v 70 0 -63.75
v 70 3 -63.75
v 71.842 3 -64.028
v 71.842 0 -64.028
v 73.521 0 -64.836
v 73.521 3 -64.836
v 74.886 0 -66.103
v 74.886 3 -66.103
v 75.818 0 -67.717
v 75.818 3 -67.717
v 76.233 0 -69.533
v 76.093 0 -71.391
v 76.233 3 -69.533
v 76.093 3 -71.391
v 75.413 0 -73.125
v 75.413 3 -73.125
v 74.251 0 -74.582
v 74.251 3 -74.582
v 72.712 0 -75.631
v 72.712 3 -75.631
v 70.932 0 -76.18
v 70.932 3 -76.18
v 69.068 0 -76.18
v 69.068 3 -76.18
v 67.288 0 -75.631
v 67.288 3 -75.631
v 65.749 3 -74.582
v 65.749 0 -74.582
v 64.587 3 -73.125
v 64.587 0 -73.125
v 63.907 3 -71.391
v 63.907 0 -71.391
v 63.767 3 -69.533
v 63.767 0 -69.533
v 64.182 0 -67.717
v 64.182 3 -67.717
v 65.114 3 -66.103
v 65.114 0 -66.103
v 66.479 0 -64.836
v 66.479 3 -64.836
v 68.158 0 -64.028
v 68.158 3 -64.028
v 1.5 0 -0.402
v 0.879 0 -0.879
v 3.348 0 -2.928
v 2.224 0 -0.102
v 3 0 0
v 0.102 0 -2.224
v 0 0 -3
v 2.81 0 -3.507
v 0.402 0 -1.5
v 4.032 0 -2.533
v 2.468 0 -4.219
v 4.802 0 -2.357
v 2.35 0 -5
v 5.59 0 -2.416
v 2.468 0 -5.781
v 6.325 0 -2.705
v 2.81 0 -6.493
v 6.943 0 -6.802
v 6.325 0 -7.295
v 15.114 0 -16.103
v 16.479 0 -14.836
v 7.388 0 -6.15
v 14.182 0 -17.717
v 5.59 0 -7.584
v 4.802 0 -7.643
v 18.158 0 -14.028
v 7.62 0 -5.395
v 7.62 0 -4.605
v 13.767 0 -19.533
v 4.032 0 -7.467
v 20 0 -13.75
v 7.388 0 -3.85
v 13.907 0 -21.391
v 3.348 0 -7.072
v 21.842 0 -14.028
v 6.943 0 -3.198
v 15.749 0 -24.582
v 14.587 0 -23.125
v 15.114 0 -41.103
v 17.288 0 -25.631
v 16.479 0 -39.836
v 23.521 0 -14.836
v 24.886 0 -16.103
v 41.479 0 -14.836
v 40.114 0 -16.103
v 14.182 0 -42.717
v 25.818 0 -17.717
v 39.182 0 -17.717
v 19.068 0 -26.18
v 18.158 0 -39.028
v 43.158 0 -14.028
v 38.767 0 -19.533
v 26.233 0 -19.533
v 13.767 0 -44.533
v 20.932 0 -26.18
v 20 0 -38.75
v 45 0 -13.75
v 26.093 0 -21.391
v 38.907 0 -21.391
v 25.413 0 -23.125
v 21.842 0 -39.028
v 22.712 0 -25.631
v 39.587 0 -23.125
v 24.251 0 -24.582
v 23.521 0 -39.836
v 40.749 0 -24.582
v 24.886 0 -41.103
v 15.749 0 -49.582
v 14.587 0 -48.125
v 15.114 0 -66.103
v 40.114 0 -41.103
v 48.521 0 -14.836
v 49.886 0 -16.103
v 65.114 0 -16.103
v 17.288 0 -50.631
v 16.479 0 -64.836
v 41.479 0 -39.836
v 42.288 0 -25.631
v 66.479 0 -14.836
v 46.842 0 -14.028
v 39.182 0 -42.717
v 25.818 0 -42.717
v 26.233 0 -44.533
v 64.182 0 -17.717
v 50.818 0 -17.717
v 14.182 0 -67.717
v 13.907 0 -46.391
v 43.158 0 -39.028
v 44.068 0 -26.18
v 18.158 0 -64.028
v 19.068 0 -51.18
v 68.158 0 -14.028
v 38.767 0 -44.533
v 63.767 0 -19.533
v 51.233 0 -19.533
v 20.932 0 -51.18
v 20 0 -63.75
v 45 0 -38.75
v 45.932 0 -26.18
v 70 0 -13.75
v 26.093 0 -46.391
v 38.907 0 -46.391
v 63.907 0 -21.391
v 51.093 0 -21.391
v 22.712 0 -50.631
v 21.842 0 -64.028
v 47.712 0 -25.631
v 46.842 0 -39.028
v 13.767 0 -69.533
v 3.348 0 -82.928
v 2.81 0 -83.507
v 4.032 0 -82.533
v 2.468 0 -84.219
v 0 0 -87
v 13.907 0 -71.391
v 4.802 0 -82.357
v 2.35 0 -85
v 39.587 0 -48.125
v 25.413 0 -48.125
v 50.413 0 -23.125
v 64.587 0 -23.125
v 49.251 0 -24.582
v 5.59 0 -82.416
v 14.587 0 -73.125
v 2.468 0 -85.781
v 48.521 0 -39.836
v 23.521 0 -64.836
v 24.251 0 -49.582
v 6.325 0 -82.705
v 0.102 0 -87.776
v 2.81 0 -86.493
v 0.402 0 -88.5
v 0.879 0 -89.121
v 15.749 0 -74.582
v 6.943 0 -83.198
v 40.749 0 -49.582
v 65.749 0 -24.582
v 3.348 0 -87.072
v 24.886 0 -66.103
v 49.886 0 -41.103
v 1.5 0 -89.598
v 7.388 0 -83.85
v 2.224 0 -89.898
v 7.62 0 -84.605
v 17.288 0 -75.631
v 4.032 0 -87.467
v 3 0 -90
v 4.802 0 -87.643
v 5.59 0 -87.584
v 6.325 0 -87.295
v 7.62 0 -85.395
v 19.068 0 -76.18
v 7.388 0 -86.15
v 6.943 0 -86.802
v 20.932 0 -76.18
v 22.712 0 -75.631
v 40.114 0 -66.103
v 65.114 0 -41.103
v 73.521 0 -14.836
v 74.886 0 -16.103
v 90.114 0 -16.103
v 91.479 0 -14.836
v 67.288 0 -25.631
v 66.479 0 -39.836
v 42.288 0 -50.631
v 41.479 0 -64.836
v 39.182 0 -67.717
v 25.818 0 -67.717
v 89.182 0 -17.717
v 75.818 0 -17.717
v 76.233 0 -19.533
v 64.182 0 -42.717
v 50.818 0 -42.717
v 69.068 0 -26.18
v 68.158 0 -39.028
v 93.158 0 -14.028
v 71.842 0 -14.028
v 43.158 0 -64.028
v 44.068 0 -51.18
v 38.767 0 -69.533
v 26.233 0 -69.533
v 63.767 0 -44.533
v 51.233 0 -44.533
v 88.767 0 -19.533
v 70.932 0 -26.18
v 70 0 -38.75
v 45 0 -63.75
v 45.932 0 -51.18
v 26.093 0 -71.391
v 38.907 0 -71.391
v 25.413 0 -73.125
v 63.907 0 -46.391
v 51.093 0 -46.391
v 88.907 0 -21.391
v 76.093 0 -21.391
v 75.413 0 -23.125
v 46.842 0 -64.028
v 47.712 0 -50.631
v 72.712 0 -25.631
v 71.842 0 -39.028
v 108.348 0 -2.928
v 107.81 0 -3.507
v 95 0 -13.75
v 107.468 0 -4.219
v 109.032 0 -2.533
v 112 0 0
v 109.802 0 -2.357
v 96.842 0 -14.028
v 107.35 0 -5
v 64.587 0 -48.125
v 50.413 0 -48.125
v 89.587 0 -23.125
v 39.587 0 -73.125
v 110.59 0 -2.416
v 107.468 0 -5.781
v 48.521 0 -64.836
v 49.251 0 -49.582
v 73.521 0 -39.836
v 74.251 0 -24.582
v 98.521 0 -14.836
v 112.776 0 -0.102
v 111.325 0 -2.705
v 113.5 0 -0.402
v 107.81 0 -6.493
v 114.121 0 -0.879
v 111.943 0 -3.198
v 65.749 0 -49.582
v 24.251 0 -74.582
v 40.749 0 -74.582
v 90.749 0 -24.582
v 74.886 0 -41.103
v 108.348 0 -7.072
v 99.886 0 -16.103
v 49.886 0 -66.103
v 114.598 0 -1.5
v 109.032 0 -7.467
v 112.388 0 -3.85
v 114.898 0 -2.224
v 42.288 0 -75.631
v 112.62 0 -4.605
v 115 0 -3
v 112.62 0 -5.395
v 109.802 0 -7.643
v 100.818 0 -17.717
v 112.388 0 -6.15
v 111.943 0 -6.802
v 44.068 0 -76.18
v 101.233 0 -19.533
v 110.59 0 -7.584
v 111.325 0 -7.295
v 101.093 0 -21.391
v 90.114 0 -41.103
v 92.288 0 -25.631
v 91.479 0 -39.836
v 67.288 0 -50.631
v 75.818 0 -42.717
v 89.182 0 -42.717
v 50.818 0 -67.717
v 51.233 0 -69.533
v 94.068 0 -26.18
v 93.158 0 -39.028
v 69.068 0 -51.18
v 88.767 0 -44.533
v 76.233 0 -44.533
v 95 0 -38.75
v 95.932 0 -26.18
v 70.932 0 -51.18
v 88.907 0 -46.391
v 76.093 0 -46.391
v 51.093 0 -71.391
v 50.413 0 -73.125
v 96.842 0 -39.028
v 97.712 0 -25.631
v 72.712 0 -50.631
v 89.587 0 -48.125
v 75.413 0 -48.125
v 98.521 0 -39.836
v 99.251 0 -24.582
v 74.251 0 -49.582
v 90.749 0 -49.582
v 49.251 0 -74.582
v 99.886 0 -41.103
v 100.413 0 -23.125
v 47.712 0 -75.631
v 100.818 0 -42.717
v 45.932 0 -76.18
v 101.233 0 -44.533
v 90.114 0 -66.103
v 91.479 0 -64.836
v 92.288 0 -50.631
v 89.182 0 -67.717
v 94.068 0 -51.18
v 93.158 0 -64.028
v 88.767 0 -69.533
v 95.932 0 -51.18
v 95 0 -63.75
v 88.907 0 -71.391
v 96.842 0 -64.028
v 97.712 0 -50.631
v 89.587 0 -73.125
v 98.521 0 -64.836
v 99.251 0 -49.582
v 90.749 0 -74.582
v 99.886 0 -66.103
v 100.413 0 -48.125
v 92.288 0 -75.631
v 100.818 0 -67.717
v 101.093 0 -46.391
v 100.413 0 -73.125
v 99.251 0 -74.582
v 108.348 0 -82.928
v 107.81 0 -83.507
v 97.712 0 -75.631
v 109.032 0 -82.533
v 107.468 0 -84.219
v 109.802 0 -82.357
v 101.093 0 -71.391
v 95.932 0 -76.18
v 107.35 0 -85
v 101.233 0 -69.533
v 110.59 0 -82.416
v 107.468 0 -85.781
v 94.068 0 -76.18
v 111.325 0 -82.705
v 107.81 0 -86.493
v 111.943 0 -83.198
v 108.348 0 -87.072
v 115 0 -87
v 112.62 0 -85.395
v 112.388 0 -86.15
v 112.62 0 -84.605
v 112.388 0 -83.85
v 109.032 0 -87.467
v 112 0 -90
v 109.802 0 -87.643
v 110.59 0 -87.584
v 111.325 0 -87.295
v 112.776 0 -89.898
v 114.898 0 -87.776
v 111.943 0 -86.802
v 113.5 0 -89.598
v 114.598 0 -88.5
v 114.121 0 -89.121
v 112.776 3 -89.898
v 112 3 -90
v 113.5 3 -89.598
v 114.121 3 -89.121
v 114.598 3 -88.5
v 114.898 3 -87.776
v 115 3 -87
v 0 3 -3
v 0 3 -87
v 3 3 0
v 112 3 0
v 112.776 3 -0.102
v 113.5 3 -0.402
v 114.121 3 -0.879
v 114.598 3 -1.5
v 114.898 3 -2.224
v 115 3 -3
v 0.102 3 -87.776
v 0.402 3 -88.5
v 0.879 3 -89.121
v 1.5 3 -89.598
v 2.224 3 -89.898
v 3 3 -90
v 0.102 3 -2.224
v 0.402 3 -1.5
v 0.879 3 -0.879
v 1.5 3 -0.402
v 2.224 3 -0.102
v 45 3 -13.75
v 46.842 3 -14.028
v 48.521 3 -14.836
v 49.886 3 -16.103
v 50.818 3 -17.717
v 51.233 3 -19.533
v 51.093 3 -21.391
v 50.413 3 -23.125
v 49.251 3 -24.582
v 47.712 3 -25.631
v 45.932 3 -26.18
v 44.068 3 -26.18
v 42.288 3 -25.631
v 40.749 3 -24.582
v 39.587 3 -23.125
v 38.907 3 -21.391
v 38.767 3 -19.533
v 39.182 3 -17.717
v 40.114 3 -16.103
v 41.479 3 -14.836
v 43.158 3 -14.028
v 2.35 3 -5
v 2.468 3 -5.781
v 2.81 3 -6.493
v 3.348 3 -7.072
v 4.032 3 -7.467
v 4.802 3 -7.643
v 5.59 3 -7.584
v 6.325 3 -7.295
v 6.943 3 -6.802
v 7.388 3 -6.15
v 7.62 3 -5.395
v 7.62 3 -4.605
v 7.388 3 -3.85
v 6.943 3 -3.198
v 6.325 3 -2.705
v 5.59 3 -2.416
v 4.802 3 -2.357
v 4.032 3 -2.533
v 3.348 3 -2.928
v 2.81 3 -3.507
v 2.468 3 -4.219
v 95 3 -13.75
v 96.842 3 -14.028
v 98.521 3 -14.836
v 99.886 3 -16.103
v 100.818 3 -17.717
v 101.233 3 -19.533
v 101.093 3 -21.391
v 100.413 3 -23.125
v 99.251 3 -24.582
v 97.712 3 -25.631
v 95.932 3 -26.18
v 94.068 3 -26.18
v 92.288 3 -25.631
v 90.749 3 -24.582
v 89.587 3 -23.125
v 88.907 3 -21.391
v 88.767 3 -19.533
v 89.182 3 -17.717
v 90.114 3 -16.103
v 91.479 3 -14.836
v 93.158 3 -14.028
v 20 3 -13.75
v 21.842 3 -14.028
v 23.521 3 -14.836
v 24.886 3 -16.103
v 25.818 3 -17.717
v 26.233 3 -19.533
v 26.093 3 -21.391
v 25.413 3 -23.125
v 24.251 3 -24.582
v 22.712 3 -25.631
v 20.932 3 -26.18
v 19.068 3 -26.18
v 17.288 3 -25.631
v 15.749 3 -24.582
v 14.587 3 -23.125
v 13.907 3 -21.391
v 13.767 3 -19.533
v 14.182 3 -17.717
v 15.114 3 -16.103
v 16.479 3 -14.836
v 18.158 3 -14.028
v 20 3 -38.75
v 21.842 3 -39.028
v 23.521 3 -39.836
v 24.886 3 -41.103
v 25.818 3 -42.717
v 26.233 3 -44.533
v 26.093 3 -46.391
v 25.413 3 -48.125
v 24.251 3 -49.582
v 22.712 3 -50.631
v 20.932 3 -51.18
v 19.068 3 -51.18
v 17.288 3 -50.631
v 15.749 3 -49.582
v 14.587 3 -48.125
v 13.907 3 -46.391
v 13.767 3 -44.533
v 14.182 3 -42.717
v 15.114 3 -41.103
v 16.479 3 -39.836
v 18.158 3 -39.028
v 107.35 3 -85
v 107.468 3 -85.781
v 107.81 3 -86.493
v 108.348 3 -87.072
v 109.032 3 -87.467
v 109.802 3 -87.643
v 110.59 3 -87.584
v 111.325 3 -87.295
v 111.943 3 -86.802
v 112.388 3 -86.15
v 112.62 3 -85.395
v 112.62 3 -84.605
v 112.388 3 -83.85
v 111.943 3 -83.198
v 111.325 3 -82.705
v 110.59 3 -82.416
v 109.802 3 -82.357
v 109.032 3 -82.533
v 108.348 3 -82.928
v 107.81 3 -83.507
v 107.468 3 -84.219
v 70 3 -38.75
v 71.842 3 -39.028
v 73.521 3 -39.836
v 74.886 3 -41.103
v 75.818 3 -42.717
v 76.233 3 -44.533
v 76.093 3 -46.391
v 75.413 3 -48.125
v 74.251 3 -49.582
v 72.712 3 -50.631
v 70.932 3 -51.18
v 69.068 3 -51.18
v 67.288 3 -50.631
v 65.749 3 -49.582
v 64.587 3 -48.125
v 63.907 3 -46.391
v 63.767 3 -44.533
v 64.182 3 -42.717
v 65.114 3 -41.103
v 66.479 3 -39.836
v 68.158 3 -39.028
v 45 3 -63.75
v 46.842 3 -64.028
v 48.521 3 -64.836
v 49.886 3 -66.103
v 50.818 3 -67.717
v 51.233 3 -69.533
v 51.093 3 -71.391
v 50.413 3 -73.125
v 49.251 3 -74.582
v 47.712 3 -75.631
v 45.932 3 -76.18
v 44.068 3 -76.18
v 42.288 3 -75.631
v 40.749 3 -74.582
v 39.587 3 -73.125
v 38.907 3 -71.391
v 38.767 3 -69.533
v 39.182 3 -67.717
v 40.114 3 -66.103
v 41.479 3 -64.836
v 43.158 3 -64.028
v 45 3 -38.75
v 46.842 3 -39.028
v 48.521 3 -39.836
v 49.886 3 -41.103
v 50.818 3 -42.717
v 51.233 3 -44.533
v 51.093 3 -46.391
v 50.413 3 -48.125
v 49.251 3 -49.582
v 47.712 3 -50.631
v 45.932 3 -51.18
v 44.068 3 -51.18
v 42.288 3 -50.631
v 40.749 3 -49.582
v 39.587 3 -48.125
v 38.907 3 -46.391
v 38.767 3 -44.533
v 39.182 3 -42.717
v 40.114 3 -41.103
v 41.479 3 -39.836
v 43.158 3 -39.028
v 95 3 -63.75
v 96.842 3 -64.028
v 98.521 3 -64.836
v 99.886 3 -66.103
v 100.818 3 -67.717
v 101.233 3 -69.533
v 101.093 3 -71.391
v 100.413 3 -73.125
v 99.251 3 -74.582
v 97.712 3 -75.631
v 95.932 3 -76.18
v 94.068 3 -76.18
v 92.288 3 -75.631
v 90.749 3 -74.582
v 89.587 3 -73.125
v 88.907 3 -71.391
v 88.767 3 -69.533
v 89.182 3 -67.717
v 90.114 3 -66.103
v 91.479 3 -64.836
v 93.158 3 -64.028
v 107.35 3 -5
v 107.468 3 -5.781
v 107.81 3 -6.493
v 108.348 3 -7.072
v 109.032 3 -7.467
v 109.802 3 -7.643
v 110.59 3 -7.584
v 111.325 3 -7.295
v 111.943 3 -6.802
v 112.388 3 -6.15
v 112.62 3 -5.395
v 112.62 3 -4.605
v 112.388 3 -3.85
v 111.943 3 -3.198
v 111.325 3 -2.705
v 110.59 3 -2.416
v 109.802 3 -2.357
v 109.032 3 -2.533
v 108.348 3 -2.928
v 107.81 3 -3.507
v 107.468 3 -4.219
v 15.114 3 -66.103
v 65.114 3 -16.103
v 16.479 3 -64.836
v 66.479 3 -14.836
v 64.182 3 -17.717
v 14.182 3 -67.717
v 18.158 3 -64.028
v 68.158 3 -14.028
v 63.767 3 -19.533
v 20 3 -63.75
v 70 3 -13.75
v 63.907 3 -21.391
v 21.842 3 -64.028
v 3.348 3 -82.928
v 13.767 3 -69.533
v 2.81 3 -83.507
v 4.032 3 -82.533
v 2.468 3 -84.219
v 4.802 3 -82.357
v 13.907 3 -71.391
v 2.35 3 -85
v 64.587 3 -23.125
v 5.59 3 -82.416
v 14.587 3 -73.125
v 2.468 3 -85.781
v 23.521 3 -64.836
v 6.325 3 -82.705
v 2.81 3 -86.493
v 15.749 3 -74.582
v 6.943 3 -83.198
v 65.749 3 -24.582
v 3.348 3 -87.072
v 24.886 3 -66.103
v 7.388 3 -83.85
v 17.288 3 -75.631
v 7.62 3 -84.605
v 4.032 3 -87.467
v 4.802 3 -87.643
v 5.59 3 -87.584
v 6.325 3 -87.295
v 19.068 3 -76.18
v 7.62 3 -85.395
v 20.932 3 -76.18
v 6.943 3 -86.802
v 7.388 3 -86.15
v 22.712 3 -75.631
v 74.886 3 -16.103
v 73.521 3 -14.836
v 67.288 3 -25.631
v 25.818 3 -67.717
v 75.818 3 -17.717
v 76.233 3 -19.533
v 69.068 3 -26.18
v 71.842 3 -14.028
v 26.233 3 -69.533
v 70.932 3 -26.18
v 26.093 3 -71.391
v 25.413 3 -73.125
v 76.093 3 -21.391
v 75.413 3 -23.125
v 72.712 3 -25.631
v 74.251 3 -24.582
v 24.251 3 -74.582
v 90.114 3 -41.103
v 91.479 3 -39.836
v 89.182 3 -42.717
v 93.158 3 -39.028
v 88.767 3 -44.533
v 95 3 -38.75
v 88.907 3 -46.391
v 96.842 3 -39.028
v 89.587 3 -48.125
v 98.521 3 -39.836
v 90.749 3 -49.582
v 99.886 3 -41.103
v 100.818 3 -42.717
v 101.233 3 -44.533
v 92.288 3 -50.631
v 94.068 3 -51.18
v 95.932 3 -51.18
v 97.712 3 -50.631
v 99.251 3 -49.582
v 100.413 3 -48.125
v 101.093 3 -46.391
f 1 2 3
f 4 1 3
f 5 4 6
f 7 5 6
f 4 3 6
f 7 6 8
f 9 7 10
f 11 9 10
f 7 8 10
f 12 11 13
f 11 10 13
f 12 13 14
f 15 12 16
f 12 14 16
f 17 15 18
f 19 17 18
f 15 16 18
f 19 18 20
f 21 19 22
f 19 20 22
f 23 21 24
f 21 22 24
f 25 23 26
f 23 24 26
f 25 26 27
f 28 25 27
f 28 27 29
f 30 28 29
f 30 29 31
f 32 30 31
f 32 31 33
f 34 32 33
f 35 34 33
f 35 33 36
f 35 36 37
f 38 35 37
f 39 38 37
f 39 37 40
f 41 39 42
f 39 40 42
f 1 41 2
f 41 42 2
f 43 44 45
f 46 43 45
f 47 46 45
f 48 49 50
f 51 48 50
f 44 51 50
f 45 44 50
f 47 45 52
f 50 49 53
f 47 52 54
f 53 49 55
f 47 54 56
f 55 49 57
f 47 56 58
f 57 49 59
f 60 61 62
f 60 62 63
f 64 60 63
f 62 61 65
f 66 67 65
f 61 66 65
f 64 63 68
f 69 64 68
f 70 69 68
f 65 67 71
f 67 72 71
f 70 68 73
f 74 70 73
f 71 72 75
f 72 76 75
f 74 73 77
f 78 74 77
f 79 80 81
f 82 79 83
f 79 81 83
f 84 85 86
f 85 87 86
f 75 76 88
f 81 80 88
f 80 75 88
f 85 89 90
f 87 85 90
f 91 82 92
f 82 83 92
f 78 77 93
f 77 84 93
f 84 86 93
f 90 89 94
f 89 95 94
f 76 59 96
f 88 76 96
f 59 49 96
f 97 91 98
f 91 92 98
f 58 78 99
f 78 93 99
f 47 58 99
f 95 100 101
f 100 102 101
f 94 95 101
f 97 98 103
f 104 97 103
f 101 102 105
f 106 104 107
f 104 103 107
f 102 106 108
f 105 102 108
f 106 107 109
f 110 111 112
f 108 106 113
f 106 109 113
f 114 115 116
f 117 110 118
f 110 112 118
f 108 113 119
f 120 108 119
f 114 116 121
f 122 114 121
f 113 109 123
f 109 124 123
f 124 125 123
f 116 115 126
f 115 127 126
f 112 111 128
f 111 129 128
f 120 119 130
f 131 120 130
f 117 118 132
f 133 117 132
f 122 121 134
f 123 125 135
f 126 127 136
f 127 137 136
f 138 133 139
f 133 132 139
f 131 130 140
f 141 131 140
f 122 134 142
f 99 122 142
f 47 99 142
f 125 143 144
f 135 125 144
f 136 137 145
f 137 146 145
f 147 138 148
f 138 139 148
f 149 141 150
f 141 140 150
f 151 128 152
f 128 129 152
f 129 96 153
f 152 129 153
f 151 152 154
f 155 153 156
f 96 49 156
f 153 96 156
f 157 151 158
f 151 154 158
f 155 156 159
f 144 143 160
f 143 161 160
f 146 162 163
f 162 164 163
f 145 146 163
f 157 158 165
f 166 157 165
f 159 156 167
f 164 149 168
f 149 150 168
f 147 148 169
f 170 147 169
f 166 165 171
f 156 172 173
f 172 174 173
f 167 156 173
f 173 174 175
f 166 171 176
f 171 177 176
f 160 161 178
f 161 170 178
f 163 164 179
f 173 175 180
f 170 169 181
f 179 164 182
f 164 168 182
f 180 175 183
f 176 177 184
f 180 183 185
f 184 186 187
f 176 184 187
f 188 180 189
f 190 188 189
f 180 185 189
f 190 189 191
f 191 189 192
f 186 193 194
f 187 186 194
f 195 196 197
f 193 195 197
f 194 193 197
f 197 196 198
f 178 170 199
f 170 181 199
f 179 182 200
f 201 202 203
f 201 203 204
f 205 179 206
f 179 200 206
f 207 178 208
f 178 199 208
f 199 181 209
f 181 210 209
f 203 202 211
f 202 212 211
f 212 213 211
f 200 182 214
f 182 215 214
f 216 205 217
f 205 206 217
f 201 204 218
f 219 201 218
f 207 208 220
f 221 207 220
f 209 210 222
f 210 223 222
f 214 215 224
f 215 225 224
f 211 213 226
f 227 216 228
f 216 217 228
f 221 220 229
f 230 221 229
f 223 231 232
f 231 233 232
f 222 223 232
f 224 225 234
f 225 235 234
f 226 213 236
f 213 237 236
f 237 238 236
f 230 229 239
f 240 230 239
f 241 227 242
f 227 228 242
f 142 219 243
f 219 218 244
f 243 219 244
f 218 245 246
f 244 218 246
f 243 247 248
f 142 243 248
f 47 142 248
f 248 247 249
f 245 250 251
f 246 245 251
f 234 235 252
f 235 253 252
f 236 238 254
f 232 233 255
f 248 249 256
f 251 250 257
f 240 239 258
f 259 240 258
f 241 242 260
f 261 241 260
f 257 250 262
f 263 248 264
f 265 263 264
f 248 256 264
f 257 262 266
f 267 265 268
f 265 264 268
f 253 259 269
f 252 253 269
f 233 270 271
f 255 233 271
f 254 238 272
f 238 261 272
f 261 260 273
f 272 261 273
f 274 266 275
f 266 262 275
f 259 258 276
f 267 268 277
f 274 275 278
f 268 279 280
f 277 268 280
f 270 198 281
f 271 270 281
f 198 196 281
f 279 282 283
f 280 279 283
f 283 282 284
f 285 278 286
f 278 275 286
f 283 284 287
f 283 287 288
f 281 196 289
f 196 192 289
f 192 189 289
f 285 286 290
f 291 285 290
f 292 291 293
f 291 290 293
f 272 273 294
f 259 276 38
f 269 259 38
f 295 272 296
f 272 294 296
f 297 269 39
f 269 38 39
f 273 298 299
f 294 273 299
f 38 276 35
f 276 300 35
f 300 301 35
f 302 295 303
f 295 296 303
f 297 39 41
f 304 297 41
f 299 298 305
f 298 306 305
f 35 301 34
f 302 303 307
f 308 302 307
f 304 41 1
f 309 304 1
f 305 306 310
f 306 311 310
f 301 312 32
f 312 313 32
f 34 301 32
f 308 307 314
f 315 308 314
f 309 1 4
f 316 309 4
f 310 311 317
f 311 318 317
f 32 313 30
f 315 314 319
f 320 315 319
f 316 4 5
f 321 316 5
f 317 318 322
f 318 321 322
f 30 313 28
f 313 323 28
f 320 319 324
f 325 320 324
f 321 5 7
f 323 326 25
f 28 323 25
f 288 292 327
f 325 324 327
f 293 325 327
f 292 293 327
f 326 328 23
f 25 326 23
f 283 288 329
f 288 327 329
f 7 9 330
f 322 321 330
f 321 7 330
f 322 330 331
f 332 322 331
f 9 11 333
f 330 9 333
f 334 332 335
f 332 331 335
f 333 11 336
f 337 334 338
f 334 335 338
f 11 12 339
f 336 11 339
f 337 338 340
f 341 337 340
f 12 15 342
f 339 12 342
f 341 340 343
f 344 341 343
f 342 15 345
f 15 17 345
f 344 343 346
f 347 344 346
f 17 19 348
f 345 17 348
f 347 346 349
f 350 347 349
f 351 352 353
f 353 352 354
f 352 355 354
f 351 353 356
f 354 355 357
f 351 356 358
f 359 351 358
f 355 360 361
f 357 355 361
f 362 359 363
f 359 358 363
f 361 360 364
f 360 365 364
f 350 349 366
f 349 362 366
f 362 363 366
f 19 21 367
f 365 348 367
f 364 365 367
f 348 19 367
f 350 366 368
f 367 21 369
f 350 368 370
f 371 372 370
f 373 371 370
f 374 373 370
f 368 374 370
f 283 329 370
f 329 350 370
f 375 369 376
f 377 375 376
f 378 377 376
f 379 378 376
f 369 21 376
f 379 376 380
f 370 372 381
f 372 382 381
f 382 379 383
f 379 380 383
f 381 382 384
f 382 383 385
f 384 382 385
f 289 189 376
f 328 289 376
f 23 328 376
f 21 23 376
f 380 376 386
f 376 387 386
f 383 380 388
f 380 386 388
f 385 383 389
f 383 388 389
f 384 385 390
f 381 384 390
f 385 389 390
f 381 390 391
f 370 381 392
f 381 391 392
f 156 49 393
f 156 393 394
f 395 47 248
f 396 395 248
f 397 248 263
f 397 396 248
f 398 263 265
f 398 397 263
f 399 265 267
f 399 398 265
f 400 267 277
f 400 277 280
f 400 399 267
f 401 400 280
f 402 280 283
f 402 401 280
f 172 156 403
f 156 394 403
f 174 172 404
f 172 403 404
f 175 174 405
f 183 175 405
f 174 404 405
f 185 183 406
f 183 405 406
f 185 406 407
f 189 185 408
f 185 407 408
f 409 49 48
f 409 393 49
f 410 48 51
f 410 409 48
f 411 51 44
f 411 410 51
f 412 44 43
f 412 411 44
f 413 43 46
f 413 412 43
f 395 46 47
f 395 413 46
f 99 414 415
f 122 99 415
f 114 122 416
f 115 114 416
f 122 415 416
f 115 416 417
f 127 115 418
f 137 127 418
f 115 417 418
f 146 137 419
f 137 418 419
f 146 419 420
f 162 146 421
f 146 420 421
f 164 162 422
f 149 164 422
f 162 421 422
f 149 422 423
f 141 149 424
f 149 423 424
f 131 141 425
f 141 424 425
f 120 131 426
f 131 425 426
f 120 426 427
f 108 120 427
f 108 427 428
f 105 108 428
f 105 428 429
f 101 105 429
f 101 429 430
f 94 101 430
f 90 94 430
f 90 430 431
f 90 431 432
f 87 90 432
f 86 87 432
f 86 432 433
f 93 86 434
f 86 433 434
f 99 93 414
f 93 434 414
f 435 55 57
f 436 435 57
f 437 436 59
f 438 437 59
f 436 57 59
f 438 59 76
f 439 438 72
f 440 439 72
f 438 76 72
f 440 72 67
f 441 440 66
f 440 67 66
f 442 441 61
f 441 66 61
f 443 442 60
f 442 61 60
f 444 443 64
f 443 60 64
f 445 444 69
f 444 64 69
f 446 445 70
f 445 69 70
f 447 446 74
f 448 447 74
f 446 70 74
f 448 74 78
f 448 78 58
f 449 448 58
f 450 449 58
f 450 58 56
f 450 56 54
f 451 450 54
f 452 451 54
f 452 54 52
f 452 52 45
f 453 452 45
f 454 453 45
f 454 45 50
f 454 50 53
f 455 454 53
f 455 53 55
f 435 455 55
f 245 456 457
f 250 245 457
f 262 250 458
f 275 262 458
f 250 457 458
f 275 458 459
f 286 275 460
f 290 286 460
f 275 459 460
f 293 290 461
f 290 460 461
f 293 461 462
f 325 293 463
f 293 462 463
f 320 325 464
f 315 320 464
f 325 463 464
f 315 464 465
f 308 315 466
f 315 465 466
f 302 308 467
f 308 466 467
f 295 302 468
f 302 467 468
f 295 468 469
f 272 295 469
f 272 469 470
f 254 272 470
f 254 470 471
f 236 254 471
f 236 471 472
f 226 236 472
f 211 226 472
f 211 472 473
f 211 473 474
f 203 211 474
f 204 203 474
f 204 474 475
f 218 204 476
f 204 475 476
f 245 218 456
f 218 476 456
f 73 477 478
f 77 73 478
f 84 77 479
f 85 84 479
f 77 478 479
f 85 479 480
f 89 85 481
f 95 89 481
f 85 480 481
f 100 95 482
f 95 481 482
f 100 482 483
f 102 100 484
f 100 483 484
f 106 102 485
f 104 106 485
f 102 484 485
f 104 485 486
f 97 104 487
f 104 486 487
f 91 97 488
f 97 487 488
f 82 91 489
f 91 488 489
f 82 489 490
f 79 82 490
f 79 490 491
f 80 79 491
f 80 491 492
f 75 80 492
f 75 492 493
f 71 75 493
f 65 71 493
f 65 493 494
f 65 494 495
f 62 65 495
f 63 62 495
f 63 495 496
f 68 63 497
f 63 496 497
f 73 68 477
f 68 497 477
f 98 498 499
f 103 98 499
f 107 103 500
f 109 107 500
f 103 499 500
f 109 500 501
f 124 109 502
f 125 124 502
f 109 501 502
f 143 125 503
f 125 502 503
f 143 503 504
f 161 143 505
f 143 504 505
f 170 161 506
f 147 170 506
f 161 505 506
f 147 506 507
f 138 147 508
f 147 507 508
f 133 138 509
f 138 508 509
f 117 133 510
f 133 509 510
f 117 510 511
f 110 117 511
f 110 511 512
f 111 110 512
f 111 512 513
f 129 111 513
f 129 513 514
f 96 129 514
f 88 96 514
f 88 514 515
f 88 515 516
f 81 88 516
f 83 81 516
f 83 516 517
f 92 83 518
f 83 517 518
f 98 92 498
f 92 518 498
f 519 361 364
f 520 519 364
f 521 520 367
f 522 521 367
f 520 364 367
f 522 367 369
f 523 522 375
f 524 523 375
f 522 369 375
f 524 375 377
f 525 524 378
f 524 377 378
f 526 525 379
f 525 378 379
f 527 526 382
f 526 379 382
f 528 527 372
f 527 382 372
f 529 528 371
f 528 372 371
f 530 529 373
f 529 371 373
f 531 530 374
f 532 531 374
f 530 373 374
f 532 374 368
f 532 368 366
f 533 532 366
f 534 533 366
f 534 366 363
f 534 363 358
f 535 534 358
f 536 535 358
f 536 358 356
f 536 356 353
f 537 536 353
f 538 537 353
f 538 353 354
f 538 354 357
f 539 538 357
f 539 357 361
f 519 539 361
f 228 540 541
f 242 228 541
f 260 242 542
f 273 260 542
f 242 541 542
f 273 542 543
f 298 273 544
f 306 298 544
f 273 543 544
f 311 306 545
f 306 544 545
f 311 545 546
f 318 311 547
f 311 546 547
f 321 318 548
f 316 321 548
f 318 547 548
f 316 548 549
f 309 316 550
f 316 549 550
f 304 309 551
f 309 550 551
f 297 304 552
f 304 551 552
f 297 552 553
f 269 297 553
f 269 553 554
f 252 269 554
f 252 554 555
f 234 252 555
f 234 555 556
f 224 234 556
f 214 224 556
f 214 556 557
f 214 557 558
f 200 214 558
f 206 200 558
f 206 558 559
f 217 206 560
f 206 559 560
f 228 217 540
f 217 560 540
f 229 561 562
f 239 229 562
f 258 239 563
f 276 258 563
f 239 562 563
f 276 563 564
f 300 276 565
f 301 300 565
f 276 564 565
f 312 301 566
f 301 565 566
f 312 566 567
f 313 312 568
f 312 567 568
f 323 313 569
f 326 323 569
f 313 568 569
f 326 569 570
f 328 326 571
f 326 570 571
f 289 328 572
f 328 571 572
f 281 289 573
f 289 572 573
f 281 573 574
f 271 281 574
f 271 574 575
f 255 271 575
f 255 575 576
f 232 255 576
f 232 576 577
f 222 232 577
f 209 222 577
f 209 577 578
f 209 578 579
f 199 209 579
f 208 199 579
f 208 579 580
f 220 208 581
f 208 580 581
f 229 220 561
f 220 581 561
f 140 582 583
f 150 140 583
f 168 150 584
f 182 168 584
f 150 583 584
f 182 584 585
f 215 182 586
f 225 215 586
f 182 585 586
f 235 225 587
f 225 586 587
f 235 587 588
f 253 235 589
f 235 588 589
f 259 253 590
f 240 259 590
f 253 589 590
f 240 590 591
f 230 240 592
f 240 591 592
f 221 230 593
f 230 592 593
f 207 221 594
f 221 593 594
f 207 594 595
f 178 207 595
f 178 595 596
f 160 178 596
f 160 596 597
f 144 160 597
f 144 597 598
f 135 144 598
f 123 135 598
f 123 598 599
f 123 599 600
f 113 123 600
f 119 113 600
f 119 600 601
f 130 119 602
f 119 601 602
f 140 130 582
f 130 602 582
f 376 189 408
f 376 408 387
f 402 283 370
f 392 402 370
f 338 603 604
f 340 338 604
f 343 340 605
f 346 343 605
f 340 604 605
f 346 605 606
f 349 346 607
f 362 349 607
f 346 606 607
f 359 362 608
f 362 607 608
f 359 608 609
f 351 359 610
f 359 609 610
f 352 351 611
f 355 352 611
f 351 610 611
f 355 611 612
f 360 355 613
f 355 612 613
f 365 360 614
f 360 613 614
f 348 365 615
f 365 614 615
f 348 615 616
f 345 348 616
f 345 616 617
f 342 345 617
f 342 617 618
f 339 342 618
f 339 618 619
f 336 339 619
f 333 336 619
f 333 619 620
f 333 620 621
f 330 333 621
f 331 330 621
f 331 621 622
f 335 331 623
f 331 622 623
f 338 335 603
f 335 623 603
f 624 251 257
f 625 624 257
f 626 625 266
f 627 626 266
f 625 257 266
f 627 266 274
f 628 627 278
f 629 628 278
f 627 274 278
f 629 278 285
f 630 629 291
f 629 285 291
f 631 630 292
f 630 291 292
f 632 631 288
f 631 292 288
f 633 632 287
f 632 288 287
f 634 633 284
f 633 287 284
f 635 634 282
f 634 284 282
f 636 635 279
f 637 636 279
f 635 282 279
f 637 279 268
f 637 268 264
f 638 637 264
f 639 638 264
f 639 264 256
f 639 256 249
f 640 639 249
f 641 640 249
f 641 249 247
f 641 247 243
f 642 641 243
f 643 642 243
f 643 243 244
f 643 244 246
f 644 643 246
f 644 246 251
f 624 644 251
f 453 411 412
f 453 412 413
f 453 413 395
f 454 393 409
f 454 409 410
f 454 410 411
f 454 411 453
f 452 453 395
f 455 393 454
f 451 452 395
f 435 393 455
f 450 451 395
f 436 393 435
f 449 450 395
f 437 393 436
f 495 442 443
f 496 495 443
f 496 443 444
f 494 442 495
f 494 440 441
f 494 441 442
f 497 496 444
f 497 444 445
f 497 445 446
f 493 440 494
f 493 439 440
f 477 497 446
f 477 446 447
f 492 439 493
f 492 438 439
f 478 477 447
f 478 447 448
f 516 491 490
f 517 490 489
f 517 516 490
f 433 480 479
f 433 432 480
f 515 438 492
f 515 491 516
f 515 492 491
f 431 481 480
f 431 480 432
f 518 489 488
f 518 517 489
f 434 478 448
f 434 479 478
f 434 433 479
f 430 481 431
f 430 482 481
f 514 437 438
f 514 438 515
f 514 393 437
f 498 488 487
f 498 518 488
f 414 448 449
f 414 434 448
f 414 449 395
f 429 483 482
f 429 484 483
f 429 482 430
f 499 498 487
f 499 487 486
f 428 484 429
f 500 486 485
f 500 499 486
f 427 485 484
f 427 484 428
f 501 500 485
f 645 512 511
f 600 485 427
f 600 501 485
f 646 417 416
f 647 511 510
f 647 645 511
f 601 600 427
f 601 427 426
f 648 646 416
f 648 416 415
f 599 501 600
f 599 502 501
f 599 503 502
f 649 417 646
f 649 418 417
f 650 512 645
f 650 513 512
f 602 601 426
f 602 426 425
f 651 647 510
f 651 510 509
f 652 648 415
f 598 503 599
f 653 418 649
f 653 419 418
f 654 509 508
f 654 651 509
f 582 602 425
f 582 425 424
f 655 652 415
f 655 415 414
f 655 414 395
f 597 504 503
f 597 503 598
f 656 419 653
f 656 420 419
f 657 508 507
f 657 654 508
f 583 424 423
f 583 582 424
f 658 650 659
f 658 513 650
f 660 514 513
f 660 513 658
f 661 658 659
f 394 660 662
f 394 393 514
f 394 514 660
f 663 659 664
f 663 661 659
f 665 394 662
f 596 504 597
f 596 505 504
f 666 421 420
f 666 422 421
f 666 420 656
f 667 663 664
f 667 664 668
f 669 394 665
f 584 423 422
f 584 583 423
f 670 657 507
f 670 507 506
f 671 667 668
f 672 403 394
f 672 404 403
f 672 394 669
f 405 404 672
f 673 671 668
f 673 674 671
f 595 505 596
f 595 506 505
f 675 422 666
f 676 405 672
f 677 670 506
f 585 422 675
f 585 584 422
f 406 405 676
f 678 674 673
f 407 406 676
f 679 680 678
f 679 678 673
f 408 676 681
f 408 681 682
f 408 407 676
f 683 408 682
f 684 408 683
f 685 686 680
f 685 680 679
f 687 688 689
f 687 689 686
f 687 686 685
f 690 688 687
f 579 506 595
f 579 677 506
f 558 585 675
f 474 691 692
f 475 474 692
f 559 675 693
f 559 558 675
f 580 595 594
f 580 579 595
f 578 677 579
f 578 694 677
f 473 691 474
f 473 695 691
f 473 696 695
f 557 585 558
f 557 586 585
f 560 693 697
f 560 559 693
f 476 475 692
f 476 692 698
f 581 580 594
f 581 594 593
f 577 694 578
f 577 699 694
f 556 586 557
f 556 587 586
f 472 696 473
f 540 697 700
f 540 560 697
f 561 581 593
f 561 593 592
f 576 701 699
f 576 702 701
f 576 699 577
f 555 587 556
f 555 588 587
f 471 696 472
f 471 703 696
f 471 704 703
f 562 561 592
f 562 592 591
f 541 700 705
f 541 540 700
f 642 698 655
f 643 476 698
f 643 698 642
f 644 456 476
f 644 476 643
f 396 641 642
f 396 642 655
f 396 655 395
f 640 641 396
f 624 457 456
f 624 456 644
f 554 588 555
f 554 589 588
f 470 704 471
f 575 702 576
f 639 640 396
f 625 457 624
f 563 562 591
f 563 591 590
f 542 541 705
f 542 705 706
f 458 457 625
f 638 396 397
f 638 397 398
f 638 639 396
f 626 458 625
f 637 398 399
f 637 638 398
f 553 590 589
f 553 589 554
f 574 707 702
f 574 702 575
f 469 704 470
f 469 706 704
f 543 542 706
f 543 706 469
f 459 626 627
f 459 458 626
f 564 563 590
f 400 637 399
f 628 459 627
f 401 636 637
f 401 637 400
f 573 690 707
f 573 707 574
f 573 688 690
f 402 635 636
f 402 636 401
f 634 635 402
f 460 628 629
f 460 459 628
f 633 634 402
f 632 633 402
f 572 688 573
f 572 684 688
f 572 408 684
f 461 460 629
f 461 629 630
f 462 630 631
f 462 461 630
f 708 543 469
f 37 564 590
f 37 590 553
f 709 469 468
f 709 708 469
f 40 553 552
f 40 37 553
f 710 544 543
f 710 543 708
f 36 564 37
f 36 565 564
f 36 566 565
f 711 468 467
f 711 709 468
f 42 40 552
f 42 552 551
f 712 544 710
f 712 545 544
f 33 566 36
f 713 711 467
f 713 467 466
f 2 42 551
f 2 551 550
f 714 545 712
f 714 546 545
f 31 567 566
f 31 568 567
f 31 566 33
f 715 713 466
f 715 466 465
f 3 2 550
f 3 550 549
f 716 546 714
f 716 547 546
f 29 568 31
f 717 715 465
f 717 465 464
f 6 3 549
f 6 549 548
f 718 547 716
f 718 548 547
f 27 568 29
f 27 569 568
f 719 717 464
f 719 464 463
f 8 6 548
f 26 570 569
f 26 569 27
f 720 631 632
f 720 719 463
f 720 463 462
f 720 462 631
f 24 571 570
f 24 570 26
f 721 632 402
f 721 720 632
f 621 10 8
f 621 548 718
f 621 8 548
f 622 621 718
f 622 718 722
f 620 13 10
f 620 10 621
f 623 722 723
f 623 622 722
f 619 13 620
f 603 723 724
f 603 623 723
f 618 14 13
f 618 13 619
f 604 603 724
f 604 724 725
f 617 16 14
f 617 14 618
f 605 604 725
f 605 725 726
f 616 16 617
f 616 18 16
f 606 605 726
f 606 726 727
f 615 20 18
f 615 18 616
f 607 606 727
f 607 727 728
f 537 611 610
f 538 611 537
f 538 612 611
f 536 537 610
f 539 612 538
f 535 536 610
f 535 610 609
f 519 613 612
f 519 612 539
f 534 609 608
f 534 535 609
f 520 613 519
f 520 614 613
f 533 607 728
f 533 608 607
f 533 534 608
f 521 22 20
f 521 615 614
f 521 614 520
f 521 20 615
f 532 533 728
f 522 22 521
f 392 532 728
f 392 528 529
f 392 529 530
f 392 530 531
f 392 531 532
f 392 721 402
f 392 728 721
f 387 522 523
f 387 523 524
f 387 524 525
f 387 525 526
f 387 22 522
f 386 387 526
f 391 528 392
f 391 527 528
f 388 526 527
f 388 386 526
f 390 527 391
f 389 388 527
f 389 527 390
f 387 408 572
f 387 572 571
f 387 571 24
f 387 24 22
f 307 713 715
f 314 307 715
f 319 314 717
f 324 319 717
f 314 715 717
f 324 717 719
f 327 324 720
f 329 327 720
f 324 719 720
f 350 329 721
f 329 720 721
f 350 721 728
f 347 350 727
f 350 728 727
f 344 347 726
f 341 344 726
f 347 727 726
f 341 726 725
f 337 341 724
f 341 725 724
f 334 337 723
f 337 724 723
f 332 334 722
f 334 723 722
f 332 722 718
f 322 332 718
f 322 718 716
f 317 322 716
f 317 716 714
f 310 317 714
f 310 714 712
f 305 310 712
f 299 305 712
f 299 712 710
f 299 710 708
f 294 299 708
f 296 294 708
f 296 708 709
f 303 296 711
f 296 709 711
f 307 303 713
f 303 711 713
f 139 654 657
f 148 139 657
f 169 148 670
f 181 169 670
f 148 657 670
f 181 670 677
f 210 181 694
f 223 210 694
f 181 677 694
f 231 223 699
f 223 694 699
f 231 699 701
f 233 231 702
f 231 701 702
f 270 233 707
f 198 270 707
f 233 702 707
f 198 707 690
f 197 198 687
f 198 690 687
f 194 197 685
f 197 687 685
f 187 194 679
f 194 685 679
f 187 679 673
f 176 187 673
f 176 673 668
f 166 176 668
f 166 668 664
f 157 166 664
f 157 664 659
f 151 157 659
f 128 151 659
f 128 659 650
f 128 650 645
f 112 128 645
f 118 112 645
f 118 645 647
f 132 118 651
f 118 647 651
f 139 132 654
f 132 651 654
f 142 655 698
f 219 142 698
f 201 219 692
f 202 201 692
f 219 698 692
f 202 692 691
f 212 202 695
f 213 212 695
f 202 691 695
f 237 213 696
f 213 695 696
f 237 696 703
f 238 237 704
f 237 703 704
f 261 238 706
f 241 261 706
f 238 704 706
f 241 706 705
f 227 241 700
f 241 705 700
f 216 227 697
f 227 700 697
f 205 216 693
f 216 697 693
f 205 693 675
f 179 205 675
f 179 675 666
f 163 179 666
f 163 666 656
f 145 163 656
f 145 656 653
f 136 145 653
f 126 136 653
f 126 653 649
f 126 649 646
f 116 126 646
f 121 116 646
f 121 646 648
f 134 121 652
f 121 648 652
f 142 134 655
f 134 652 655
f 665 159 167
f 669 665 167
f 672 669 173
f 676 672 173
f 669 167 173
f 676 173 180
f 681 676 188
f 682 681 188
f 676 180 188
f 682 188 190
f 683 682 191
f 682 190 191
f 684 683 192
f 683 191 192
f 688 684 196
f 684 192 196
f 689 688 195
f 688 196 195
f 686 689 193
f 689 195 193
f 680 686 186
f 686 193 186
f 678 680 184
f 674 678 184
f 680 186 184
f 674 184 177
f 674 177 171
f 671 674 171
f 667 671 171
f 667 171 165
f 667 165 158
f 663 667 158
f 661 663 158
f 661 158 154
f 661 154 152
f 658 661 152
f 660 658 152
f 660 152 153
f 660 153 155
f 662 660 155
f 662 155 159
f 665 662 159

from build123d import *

# Parameters (mm, degrees)
SKETCH1_W            = 115
SKETCH1_H            = 90
BOSS_EXTRUDE1_DEPTH  = 3
SKETCH2_R            = 6.25
CUT_EXTRUDE1_DEPTH   = 3
LPATTERN1_COUNT      = 4
LPATTERN1_PITCH      = 25
LPATTERN1_COUNT_DIR2 = 3
LPATTERN1_PITCH_DIR2 = 25
FILLET1_R            = 3
M5_CLEARANCE_HOLE1_D = 5.3


with BuildPart() as part:
    # Sketch1 → Boss-Extrude1 (new body)
    with BuildSketch(Plane(origin=(0, 0, 0), x_dir=(1, 0, 0), z_dir=(0, 1, 0))):
        with Locations((57.5, 45)):
            Rectangle(SKETCH1_W, SKETCH1_H)
    extrude(amount=BOSS_EXTRUDE1_DEPTH)

    # Sketch2 → Cut-Extrude1 (cut)
    with BuildSketch(Plane(origin=(0, 3, 0), x_dir=(1, 0, 0), z_dir=(0, 1, 0))):
        with Locations(Location((20, 70, 0), (0, 0, 270))):
            Circle(SKETCH2_R)
    cut_extrude1 = extrude(amount=-CUT_EXTRUDE1_DEPTH, mode=Mode.SUBTRACT)

    # LPattern1: Cut-Extrude1 4 × 3
    with Locations(*[(i * LPATTERN1_PITCH, 0, j * LPATTERN1_PITCH_DIR2) for i in range(LPATTERN1_COUNT) for j in range(LPATTERN1_COUNT_DIR2) if (i, j) != (0, 0)]):
        add(cut_extrude1, mode=Mode.SUBTRACT)

    # Fillet1
    fillet1_edges = [part.edges().sort_by_distance(p)[0] for p in [
        (0, 1.5, -90),
        (115, 1.5, -90),
        (115, 1.5, 0),
        (0, 1.5, 0),
    ]]
    fillet(fillet1_edges, radius=FILLET1_R)

    # M5 Clearance Hole1 (through all)
    with Locations(Plane(origin=(0, 3, 0), x_dir=(1, 0, 0), z_dir=(0, 1, 0))):
        with Locations((5, 85), (5, 5), (110, 5), (110, 85)):
            Hole(M5_CLEARANCE_HOLE1_D / 2)


solid = part.part
